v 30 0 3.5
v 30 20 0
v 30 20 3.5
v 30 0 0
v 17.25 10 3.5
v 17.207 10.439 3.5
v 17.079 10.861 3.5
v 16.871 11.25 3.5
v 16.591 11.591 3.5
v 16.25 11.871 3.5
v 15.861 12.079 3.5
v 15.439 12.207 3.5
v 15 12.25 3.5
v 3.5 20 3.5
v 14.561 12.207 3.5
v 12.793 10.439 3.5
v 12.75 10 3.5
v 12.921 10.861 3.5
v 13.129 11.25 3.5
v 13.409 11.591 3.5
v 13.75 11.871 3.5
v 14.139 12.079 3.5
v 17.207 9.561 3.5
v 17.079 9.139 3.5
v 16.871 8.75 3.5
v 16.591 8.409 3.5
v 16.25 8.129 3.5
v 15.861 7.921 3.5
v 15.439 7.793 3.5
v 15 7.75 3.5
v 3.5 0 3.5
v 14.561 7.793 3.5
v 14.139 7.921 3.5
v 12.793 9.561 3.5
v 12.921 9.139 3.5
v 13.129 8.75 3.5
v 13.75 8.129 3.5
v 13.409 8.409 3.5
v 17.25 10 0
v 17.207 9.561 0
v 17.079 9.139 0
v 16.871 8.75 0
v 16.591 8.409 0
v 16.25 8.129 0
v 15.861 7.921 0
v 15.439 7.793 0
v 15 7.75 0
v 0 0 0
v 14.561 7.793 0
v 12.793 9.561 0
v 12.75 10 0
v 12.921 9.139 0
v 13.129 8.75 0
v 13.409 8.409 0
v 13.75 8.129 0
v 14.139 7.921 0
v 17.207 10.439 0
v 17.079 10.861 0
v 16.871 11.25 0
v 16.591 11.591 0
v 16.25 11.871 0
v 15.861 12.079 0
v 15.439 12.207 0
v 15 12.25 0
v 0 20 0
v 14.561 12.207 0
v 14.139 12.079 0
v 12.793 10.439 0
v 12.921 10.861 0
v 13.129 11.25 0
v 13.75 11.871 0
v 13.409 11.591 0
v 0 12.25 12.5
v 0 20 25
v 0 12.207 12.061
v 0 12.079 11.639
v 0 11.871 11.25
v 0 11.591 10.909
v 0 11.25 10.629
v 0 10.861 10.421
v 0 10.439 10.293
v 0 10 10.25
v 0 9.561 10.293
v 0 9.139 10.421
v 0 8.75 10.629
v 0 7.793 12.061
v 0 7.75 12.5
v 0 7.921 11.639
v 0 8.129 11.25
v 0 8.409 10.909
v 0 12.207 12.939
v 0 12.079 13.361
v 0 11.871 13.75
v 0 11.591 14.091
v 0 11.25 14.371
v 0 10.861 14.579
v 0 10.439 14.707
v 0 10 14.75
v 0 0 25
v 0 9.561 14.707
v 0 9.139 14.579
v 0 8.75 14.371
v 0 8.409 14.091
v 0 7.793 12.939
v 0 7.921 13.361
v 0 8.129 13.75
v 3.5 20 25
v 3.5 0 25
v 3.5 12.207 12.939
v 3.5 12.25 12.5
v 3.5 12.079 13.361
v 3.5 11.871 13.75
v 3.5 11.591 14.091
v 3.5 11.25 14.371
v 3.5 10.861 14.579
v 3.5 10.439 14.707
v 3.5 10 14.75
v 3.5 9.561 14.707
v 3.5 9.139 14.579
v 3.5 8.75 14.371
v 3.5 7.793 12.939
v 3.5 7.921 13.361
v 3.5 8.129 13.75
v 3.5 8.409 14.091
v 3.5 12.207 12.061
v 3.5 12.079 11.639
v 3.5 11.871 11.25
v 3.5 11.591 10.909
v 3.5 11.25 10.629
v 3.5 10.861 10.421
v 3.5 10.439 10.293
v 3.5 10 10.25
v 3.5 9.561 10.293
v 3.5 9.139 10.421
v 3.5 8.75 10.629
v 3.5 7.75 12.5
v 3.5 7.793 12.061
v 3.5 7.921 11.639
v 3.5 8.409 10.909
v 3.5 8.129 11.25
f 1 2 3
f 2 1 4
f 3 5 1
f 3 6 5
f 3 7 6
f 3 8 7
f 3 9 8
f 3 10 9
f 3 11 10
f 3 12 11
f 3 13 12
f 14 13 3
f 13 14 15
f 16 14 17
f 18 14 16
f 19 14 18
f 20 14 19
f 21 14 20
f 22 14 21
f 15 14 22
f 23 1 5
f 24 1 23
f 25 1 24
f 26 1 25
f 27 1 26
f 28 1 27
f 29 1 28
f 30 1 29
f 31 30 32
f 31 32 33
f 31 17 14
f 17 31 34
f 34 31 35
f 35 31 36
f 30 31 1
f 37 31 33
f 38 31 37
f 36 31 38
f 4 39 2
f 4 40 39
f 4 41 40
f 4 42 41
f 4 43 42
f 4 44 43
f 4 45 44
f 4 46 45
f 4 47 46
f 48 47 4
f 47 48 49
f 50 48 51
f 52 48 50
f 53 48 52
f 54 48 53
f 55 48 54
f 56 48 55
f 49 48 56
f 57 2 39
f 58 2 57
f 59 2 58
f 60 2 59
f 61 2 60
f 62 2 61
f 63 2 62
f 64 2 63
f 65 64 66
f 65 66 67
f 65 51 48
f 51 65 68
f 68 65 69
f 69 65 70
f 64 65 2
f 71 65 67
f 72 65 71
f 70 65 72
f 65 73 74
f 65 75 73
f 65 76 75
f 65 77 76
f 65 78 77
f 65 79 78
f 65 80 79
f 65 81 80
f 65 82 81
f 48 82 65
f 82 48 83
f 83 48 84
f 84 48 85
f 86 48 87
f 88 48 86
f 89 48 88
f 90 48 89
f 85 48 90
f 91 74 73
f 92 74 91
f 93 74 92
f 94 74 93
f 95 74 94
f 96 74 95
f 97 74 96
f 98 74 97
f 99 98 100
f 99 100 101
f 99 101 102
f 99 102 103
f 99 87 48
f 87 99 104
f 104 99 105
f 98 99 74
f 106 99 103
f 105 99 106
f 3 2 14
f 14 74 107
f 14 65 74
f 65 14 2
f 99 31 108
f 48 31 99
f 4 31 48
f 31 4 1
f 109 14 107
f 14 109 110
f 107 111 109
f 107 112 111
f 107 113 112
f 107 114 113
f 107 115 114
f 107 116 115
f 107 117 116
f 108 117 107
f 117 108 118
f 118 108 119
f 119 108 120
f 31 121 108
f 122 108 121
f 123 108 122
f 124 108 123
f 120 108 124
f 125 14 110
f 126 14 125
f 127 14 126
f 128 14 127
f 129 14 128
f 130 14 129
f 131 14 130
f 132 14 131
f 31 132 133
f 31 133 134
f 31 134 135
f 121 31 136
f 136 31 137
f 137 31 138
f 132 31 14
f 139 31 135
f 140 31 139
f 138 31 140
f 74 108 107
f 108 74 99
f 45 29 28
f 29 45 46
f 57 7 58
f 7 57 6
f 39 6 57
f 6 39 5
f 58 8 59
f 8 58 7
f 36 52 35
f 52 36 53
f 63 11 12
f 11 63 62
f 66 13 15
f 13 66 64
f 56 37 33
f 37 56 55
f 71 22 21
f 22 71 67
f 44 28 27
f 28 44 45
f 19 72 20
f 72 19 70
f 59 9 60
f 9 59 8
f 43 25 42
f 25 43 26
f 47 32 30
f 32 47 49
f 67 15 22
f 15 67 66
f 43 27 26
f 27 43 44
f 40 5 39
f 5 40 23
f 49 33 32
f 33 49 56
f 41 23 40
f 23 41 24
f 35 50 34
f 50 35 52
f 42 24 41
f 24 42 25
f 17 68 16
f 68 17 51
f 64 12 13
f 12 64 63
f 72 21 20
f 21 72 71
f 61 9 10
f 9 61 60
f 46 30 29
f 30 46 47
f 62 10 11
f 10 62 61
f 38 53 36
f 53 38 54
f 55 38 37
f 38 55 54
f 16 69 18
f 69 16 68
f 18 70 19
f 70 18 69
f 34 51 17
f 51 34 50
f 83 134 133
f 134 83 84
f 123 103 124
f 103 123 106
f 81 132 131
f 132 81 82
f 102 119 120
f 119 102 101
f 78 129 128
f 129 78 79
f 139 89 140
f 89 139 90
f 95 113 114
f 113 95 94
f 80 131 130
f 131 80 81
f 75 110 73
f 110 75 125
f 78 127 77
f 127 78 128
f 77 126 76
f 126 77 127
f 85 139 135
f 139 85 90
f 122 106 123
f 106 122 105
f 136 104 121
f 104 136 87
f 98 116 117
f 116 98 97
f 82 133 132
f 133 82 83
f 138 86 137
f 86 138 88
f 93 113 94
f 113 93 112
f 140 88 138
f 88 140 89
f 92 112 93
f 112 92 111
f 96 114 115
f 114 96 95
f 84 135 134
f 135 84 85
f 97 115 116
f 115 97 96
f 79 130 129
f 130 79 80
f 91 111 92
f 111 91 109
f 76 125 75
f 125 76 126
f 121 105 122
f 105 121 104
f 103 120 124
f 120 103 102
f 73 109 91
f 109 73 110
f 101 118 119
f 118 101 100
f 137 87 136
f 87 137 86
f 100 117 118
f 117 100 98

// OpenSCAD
$fn = 32;

// ----------------------------------------------------------------------
// L-bracket: 30 x 20 x 25 mm
// ----------------------------------------------------------------------

// --- parameters (mm) ---
base_len = 30;            // horizontal leg, X
upright_h = 25;           // vertical leg, Z
flange_w = 20;            // bracket depth, Y
mat_t = 3.5;              // plate thickness
hole_d = 4.5;             // clearance for M4

module hole_z(px, py) {
  translate([px, py, -0.5]) cylinder(h = mat_t + 1, d = hole_d);
}
module hole_x(pz, py) {
  translate([-0.5, py, pz]) rotate([0, 90, 0]) cylinder(h = mat_t + 1, d = hole_d);
}

difference() {
  union() {
    /* horizontal leg */
    cube([base_len, flange_w, mat_t]);
    /* vertical leg, overlapping the corner block */
    cube([mat_t, flange_w, upright_h]);
  }
  hole_z(15, 10);
  hole_x(12.5, 10);
}
